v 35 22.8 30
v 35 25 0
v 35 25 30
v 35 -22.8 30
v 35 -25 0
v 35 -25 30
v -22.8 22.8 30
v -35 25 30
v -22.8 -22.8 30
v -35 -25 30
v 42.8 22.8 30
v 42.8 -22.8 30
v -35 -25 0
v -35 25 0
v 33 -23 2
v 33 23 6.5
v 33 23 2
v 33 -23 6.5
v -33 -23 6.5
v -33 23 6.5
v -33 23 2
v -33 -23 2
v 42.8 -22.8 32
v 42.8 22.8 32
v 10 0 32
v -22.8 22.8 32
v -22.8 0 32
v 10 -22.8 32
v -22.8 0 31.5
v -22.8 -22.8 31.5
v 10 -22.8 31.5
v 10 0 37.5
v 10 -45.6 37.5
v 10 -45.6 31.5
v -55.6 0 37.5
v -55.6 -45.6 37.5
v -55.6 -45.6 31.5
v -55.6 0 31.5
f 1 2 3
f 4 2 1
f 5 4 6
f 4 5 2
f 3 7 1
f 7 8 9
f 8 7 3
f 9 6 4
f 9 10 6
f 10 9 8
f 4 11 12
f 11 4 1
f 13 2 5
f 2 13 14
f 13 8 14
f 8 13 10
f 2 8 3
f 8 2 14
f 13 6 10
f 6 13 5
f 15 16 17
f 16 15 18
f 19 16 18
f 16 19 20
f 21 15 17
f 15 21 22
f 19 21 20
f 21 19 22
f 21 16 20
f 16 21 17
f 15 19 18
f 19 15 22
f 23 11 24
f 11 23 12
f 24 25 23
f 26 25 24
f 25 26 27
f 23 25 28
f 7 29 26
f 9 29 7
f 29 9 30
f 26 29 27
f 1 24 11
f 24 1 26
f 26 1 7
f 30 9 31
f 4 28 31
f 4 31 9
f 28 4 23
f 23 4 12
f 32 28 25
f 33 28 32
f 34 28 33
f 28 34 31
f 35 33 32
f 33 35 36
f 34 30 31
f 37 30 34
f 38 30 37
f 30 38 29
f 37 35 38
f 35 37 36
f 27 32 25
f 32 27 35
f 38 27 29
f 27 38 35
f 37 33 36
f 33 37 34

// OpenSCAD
// Two-part enclosure for small electronics board
// Print orientation: box standing on bed, lid upside down (plate on bed)

$fn = 64;

// ---- Box ----
box_x = 70;      // outer length (X)
box_y = 50;      // outer width (Y)
box_z = 30;      // outer height (Z)
wall = 2;        // side wall thickness
floor = 2;       // floor thickness

// ---- Lid ----
lip_w = 65.6;    // lip outer length (X)
lip_d = 45.6;    // lip outer width (Y)
lip_h = 1.5;     // lip height (wall thickness)
lip_t = 4;       // lip top thickness

// ---- Misc ----
eps = 0.5;       // cutter overshoot
gap = 10;        // gap between parts on bed

// Derived
inner_x = box_x - 2*wall;
inner_y = box_y - 2*wall;
lip_total_h = lip_h + lip_t;   // from plate top to lip top

module box() {
    difference() {
        translate([-box_x/2, -box_y/2, 0])
            cube([box_x, box_y, box_z]);
        // open top: cut down to inside of side walls
        translate([-inner_x/2, -inner_y/2, floor])
            cube([inner_x, inner_y, floor + wall + eps]);
    }
}

module lid() {
    translate([gap - lip_w/2, -lip_d/2, 0]) {
        // plate
        cube([lip_w, lip_d, 2]);
        // lip (overlaps plate slightly -> one solid)
        translate([-lip_w/2, -lip_d/2, 2 - eps])
            cube([lip_w, lip_d, lip_total_h + eps]);
    }
}

union() {
    box();
    translate([0, 0, box_z])
        lid();
}
